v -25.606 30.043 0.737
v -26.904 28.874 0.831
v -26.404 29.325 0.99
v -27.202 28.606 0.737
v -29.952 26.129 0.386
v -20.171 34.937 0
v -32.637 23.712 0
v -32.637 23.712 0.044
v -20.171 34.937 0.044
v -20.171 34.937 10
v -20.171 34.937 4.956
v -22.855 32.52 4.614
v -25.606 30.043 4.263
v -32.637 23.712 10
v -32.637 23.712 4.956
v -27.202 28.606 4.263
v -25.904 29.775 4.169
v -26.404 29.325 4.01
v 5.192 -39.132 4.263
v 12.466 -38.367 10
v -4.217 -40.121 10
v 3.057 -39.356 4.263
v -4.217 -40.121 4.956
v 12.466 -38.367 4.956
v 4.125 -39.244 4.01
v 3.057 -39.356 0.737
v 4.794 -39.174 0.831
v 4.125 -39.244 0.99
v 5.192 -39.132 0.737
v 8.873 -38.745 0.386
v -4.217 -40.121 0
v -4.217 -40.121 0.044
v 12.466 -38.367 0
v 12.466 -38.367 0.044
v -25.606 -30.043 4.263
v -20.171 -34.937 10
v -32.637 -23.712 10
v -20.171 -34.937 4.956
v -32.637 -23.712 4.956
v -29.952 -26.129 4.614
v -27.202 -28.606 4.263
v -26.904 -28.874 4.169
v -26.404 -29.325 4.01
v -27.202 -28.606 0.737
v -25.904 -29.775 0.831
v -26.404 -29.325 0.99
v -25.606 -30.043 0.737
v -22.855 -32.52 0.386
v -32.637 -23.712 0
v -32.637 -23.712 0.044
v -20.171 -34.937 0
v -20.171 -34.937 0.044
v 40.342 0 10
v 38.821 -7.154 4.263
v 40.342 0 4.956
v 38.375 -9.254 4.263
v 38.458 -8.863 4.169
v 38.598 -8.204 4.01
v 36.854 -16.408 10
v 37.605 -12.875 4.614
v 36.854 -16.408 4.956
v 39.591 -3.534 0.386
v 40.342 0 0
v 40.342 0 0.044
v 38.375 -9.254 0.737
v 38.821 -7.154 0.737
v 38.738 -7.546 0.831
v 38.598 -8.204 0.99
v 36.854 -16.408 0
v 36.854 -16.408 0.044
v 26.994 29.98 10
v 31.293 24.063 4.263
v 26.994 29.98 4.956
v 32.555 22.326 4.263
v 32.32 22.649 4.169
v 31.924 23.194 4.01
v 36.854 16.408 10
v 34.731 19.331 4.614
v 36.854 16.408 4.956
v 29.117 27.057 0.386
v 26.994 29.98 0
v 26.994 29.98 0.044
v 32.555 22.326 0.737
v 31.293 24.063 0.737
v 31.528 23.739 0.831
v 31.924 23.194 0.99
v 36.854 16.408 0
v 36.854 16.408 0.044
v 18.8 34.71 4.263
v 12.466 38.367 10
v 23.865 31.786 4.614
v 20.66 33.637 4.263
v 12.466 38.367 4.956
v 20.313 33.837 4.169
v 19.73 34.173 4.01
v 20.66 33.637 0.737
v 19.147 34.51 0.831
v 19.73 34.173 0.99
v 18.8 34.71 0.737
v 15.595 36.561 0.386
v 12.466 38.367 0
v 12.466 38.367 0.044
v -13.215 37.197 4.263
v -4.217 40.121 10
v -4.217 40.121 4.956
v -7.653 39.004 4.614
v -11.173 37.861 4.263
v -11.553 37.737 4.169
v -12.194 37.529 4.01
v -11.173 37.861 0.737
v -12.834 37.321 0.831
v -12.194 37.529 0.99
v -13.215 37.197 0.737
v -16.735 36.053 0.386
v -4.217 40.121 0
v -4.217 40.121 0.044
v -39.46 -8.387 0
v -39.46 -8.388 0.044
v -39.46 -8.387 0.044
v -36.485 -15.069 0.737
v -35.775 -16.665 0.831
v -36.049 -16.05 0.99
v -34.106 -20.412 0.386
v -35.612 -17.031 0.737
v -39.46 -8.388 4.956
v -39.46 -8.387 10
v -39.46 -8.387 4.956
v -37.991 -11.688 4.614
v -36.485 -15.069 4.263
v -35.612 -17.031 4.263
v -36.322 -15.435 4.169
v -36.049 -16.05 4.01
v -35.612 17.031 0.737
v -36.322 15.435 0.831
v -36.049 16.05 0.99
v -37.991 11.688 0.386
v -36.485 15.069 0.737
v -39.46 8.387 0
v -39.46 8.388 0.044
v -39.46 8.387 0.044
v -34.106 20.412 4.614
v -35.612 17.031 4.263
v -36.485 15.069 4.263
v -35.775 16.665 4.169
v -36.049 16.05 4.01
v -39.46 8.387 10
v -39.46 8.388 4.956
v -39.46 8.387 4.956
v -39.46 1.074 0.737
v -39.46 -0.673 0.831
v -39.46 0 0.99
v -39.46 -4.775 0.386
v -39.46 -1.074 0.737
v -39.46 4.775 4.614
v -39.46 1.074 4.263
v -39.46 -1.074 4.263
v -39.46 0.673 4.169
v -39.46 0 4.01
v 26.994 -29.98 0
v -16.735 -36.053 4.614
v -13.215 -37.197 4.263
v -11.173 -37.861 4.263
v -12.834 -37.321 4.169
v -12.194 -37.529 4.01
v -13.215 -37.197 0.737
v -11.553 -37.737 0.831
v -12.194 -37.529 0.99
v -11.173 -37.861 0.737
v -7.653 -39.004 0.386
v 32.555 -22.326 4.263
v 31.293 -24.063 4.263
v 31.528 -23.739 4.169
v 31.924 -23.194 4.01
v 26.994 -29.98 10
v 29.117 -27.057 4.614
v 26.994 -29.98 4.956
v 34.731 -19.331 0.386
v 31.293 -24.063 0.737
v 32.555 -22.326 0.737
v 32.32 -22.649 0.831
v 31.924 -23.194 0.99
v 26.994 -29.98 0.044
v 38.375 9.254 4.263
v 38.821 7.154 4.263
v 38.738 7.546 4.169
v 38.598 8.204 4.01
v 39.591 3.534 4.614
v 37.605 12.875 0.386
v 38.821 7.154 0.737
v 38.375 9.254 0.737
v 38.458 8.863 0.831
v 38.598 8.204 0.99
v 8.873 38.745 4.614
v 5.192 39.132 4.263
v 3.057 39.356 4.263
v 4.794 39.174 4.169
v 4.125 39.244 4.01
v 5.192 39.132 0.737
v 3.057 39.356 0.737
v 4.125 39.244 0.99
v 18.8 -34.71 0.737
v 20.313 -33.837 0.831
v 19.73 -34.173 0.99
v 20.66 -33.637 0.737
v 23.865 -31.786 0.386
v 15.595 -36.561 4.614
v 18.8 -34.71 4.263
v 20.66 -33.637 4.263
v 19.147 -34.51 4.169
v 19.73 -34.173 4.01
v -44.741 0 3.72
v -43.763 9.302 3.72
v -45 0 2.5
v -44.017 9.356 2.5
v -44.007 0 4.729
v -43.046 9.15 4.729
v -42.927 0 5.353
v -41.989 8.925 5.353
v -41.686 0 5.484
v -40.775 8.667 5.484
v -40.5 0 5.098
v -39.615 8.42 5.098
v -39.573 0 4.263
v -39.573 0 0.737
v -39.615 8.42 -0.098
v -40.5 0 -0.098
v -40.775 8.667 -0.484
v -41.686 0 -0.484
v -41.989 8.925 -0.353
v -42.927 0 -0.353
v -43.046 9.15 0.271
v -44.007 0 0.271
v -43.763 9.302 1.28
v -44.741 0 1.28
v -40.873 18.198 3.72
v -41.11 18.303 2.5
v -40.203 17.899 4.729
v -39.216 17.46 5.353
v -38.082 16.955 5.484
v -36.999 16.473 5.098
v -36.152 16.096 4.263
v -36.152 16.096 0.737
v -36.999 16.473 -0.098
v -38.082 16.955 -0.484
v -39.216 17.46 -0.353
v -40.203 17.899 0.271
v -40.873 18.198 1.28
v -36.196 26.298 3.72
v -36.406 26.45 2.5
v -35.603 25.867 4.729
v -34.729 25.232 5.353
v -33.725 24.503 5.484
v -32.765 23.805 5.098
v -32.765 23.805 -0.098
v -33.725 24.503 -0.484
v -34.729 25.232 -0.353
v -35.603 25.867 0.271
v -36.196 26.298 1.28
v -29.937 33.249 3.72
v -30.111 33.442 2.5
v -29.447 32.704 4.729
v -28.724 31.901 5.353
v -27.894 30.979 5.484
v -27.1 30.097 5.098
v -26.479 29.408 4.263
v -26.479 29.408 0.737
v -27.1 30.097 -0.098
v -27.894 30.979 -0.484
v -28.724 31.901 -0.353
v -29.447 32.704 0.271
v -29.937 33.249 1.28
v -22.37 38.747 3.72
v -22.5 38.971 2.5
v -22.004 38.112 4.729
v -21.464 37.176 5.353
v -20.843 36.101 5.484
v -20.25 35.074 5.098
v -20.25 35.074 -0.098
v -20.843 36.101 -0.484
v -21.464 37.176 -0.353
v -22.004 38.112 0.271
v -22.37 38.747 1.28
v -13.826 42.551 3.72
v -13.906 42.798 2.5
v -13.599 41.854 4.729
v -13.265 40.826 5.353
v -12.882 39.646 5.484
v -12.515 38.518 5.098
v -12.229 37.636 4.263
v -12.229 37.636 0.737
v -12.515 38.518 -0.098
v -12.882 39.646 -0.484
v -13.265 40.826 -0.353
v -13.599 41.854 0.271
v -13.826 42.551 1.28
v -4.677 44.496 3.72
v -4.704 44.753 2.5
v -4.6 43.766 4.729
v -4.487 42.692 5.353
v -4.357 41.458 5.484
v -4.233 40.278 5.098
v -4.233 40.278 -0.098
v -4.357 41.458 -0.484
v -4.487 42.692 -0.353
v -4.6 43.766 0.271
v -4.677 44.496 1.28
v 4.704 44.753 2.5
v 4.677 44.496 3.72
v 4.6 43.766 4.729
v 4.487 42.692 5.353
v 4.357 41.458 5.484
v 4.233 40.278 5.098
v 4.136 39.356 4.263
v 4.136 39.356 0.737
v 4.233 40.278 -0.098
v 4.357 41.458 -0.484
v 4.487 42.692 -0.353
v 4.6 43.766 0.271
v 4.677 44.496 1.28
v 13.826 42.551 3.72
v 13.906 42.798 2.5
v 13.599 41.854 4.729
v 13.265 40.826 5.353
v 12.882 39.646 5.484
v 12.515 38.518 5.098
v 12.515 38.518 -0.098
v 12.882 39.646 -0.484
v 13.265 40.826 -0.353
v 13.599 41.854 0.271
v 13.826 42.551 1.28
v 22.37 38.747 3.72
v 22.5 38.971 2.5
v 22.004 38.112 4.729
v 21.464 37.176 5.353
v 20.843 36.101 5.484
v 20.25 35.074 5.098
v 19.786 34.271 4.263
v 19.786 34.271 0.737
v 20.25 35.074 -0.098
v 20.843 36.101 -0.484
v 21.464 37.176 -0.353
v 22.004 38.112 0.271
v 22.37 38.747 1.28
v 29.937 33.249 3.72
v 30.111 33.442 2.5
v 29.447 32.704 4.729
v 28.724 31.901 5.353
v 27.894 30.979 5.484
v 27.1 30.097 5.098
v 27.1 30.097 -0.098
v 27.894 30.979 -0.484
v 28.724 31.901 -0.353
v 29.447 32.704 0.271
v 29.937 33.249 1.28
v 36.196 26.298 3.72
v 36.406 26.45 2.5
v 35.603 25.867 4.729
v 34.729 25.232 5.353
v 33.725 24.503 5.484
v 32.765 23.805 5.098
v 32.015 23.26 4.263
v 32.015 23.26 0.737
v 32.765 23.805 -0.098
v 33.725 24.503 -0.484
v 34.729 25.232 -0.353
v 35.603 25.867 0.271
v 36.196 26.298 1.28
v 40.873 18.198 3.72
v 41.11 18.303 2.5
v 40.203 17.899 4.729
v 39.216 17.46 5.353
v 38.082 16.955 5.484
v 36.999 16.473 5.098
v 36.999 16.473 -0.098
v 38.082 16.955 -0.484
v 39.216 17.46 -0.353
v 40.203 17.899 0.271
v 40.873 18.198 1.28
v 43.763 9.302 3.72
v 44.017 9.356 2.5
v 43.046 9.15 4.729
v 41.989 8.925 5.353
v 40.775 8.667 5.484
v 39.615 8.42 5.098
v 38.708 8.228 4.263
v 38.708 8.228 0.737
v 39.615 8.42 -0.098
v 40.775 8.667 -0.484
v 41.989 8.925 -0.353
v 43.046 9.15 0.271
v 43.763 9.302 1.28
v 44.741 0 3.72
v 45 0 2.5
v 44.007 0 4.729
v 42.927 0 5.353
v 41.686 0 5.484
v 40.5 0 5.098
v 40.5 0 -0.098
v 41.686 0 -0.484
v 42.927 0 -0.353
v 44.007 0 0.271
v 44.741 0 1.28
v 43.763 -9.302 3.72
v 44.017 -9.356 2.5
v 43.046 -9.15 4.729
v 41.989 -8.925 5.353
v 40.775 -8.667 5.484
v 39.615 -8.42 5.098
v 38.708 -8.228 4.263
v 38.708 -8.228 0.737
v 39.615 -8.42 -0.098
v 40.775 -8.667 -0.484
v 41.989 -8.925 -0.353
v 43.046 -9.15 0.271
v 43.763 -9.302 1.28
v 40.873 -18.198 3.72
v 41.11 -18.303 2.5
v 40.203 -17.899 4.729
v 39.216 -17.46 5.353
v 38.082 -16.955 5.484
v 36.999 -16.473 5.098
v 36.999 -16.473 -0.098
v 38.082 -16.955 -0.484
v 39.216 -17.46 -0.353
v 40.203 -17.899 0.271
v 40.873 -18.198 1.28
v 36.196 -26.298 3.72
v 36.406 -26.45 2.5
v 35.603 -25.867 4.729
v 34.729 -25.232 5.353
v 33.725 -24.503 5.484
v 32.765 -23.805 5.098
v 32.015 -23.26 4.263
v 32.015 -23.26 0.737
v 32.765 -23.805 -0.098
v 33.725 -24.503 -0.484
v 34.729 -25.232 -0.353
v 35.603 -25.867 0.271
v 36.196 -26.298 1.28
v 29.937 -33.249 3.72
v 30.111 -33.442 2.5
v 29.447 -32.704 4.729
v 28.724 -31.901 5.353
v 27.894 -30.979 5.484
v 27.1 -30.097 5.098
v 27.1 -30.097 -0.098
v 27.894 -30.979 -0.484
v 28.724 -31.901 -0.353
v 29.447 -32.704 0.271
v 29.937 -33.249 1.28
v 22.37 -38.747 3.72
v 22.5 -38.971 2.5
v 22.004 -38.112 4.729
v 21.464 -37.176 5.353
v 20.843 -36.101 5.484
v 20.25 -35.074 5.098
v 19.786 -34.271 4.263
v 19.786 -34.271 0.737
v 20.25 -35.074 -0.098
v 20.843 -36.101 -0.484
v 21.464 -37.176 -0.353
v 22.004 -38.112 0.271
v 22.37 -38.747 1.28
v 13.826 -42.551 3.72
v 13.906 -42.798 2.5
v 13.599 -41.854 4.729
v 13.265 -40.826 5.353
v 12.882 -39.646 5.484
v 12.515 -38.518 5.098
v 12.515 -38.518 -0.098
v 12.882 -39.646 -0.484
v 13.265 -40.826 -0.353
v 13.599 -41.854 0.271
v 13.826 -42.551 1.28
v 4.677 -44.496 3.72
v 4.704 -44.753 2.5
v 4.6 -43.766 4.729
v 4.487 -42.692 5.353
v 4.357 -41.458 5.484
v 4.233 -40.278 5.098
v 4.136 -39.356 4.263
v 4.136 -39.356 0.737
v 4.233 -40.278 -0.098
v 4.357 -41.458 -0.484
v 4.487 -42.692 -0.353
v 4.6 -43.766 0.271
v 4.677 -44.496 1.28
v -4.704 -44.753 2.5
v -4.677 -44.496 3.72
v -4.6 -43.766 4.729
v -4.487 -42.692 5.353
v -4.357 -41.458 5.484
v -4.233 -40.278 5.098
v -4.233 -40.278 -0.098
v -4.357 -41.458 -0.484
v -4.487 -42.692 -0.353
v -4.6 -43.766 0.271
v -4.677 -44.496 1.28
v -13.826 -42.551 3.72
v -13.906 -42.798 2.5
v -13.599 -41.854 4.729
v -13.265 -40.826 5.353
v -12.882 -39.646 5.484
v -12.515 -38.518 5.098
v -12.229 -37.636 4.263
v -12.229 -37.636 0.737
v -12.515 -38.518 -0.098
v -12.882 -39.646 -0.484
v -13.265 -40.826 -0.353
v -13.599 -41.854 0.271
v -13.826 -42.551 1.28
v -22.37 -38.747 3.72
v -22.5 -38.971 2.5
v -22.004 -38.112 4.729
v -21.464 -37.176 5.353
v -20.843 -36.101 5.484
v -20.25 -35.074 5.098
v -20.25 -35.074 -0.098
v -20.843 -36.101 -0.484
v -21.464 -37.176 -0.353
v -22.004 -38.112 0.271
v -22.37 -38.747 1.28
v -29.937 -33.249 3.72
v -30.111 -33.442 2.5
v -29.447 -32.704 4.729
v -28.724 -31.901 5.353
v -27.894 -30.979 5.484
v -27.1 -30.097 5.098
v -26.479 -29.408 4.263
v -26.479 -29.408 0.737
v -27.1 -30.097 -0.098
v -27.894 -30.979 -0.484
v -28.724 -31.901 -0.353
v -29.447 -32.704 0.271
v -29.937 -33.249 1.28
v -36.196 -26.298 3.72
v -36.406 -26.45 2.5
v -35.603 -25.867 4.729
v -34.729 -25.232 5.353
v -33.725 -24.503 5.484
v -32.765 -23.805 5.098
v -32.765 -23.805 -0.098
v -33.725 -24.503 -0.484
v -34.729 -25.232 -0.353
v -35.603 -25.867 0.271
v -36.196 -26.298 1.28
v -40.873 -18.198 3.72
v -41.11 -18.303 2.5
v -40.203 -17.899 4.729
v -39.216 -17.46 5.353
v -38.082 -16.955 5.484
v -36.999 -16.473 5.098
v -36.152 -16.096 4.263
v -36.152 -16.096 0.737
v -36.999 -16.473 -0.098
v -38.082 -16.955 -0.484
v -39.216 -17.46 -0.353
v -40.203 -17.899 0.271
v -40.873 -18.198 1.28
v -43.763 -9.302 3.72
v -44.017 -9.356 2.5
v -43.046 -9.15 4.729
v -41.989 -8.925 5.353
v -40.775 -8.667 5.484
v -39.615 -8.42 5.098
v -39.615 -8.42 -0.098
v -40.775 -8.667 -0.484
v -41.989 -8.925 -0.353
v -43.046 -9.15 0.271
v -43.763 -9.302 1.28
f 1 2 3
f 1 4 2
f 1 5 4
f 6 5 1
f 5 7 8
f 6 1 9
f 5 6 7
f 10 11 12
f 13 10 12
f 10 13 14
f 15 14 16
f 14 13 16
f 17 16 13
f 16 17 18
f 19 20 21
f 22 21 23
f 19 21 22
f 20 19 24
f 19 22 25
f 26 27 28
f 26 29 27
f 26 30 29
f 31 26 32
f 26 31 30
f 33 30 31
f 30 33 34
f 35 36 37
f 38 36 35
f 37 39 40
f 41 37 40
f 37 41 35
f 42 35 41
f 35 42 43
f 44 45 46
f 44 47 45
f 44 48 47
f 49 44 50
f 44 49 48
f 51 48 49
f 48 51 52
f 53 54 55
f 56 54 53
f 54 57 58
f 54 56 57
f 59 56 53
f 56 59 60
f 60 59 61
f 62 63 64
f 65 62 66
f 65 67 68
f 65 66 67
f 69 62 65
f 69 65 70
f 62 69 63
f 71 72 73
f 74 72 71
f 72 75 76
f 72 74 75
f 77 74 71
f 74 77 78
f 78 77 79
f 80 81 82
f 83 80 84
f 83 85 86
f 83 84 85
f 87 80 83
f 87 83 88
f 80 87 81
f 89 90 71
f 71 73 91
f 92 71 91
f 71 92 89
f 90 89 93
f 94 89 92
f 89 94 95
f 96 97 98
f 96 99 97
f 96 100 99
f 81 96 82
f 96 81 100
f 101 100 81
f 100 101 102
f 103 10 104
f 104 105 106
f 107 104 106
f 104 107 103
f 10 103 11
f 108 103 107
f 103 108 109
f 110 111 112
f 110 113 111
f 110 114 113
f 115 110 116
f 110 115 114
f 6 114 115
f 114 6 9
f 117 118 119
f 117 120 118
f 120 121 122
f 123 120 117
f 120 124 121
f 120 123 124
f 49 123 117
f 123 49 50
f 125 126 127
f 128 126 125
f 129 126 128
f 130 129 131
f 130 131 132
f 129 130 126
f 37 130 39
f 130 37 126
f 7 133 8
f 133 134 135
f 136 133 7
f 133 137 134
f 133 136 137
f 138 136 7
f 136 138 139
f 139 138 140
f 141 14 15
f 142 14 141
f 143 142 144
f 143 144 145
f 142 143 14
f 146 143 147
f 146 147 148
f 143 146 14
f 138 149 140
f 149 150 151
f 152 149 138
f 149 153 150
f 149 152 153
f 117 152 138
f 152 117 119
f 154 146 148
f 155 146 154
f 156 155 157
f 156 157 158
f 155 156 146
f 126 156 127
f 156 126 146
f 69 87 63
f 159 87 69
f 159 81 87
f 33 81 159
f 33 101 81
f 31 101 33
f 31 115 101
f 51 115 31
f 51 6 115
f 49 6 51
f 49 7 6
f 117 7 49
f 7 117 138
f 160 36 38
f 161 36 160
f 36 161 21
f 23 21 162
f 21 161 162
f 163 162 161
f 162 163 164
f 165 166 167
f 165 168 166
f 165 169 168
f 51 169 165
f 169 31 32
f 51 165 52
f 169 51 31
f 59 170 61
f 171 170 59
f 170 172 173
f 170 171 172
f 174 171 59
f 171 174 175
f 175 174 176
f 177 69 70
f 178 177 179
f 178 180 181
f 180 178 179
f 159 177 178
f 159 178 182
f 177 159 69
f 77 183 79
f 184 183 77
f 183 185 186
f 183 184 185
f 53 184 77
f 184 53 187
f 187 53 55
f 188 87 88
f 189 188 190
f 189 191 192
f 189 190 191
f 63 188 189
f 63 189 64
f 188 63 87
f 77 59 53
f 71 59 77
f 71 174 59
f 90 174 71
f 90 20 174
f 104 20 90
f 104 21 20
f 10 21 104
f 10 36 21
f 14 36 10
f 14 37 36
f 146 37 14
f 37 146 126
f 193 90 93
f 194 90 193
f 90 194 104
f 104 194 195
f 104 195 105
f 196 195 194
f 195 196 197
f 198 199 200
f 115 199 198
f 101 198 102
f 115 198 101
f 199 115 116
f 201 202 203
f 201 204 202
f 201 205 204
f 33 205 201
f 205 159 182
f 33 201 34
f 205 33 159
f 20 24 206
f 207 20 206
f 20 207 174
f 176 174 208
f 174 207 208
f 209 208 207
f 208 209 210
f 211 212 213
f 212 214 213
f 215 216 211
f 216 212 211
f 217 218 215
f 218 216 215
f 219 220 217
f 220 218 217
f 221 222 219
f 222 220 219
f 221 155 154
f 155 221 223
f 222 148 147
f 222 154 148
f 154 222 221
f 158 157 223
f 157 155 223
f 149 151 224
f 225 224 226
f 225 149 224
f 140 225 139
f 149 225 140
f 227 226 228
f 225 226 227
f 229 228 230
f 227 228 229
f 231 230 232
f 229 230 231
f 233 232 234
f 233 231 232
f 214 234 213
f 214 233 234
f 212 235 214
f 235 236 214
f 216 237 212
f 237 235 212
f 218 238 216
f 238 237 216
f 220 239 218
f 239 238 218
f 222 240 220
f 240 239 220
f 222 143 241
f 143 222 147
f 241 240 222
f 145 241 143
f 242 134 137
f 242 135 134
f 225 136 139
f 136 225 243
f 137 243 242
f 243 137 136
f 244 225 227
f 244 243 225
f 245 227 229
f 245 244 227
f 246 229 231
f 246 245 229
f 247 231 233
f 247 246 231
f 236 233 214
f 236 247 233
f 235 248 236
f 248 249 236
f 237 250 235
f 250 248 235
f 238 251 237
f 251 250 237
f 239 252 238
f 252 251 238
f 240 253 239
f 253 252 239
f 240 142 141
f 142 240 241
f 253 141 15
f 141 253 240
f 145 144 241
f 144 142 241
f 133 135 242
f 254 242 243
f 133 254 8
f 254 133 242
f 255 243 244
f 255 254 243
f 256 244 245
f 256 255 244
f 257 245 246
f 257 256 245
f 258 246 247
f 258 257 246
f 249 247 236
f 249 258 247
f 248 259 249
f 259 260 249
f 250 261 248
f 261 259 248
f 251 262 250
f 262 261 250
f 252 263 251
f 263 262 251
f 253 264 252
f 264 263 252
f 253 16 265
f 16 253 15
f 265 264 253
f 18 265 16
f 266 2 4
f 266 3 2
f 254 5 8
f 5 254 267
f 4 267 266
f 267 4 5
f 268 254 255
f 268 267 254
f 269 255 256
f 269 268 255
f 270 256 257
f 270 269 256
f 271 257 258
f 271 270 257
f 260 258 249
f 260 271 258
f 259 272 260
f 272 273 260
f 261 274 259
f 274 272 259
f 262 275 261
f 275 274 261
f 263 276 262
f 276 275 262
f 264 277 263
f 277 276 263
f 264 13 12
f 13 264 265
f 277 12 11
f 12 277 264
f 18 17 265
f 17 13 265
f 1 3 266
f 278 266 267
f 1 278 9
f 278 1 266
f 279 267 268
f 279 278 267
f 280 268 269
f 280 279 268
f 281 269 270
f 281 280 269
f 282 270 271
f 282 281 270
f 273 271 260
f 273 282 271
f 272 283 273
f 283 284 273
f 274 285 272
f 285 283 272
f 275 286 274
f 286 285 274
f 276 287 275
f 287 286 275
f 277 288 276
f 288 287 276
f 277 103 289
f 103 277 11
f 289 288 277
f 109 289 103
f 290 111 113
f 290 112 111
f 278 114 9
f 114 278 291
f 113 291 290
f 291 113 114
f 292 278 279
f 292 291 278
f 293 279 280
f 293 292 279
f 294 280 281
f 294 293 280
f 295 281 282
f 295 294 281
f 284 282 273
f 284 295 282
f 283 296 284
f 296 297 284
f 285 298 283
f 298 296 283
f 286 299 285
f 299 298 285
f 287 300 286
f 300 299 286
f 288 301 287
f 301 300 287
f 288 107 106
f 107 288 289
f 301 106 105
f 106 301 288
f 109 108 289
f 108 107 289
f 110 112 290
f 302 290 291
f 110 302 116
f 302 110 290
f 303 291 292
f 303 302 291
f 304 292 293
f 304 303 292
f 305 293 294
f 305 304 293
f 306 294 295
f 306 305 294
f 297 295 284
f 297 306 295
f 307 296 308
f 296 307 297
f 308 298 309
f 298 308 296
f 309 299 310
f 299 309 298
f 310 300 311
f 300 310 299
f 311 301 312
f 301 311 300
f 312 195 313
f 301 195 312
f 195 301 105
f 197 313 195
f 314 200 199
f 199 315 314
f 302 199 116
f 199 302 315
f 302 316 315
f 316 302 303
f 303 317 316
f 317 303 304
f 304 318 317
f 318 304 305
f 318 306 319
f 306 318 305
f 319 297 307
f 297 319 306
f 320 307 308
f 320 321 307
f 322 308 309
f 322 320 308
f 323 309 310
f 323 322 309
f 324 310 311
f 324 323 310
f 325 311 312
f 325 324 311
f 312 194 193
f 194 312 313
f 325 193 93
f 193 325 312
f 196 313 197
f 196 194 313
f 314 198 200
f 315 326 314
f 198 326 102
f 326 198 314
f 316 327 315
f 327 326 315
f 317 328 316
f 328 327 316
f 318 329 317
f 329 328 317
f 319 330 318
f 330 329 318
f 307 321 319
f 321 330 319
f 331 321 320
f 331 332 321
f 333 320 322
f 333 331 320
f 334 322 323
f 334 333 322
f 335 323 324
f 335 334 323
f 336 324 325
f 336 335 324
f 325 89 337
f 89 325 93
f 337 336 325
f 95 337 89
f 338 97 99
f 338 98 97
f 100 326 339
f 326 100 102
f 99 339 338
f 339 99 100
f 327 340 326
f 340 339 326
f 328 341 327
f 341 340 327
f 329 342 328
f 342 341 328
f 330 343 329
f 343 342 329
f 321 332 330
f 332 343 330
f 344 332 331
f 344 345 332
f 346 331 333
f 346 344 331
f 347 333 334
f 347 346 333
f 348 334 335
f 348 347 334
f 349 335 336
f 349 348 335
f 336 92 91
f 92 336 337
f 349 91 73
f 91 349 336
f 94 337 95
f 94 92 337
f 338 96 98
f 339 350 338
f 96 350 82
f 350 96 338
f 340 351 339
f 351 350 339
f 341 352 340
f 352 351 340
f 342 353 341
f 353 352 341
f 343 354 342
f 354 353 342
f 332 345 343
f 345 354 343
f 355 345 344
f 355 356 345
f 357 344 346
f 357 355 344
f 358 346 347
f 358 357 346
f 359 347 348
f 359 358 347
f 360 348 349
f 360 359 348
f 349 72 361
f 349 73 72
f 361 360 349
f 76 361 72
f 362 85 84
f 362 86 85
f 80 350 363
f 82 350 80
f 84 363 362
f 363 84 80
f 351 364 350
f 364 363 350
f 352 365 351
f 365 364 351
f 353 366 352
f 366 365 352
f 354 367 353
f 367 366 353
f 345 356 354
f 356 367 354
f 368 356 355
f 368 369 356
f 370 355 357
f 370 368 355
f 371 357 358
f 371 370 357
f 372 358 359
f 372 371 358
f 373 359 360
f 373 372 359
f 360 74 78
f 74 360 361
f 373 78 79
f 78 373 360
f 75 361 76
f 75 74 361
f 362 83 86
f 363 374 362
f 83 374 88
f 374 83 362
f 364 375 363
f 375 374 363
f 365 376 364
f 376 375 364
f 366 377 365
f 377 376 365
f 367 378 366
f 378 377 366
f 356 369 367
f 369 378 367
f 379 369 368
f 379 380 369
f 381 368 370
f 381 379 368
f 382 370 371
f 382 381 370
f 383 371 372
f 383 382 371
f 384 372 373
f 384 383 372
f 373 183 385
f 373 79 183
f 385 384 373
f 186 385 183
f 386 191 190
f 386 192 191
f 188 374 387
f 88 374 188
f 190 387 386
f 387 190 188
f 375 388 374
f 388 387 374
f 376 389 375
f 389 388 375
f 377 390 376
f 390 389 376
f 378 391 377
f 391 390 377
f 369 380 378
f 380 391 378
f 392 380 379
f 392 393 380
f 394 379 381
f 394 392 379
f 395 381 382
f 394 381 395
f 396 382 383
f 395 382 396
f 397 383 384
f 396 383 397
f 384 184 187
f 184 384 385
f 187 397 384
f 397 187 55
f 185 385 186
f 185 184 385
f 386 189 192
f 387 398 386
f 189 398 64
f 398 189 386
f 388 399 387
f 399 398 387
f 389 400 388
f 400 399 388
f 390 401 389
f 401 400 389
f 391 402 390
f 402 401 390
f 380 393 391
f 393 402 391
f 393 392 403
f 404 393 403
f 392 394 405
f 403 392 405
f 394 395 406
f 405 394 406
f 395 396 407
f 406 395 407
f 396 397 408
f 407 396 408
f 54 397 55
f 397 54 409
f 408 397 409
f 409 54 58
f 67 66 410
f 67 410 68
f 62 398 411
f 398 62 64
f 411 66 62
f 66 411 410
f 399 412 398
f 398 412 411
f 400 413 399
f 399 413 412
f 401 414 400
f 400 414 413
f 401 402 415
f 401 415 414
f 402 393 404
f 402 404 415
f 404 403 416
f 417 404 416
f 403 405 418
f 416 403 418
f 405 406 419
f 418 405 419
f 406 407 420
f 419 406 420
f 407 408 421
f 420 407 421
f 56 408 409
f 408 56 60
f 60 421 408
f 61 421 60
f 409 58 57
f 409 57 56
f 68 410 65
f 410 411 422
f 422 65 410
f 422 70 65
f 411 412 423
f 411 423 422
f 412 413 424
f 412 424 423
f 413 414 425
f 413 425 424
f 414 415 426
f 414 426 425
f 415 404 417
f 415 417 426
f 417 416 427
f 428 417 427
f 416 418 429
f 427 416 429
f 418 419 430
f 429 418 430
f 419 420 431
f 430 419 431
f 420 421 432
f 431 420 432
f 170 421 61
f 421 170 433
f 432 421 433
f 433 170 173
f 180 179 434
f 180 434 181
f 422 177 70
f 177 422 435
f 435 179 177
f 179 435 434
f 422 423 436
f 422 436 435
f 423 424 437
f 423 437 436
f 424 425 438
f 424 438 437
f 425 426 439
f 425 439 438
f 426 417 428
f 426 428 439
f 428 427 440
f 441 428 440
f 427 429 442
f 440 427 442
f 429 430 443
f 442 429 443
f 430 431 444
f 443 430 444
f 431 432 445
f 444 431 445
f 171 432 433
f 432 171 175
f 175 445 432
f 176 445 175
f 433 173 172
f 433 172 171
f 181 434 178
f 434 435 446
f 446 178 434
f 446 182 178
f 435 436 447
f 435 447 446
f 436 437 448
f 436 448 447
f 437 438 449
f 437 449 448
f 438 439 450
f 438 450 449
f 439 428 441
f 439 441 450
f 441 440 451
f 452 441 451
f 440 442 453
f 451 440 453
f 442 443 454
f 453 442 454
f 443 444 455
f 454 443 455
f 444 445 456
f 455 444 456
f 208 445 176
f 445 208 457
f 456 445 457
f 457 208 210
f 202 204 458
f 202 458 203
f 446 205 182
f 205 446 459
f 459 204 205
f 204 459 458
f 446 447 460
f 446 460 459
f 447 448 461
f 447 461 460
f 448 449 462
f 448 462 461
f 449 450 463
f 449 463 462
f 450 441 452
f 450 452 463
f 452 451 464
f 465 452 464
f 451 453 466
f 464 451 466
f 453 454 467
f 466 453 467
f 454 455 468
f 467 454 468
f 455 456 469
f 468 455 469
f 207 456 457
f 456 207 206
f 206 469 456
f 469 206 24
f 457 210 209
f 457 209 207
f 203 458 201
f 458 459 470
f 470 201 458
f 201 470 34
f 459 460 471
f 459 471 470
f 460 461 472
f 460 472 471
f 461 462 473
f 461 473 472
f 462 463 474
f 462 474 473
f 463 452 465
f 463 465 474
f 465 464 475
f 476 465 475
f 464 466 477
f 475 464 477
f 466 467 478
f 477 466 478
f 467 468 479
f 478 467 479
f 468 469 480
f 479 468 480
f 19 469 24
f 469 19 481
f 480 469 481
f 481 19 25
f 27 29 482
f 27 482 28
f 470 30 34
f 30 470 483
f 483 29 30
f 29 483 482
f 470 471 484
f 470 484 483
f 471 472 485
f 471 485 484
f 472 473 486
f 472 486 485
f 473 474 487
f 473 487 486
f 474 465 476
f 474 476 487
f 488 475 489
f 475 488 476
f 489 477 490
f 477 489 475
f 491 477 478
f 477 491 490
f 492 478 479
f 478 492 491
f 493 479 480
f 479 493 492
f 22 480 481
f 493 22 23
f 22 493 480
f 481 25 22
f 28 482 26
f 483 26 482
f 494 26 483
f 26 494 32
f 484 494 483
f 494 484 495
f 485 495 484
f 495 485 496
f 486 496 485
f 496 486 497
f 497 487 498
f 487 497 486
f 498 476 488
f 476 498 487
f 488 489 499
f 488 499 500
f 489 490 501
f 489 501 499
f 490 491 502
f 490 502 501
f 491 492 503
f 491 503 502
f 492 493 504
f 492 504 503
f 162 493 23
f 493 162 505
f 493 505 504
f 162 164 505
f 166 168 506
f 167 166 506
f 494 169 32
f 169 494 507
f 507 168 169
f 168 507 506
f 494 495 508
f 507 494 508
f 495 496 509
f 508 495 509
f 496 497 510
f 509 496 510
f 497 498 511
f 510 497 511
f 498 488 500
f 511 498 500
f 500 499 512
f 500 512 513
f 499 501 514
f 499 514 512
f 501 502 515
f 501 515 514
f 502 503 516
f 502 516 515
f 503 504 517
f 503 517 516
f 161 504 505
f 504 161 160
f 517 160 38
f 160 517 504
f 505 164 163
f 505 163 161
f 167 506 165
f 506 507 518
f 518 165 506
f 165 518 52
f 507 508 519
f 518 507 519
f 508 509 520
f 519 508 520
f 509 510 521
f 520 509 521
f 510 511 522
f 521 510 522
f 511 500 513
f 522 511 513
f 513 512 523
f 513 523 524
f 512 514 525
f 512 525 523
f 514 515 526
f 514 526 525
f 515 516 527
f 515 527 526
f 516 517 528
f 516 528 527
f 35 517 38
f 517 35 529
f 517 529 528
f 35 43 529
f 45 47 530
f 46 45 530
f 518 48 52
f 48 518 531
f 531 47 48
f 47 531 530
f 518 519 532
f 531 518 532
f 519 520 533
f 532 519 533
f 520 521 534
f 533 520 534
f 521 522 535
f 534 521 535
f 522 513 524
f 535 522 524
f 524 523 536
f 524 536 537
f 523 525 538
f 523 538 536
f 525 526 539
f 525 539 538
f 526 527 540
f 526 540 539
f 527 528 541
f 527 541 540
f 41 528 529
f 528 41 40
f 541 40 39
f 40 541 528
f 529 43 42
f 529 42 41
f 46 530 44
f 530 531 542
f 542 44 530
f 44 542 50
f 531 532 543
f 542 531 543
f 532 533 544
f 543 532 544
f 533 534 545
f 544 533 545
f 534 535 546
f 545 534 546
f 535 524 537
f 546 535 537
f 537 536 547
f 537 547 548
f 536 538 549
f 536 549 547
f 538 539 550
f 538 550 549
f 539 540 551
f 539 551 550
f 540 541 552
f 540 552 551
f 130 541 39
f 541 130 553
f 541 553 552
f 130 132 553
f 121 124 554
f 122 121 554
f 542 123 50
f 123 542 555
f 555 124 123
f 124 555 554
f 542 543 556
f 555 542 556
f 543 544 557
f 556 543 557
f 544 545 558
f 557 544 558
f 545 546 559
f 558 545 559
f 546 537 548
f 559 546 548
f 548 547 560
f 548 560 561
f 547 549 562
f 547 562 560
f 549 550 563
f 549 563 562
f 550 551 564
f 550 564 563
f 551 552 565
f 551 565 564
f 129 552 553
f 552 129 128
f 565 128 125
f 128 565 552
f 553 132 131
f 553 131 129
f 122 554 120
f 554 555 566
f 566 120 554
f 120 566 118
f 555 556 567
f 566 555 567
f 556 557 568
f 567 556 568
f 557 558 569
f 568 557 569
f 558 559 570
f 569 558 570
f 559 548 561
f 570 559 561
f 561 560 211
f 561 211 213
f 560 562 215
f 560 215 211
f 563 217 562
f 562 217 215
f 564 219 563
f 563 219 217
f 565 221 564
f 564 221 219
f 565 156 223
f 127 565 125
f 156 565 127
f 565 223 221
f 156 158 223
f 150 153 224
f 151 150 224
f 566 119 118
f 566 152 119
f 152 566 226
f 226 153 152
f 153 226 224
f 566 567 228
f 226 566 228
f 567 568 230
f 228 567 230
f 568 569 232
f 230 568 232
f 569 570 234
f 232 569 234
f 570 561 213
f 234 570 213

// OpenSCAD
Pi = 3.141592653589793;
r0 = 5;
r_tube = 3;
t_rim = 5;
D_wheel = 90;
dist_tube = sqrt(pow(r_tube,2) - pow(t_rim/2,2));
echo(dist_tube);
R = D_wheel/2 - dist_tube - r_tube;
wRim = 20;
maxPhi = 270;
wall_t = 10;
t_hub = 10;
a = 15;

D = (R - wRim + wall_t)/r0;

n_spokes = 8;

function spiral(r0, D, x, phi) = (r0*exp(ln(D)/maxPhi*phi)-x)*[cos(phi),sin(phi)];
function reverse(list) = [for (i=[len(list)-1:-1:0]) list[i]];
function spiral_points(r0, D, maxPhi, x, a) = [for (i=[0:1:a]) spiral(r0, D, x, i/a*maxPhi)]; 

function spiral_polygon_points(r0, D, maxPhi, wall_t, a) = concat(spiral_points(r0, D, maxPhi, 0, a), reverse(spiral_points(r0, D, maxPhi, wall_t, a)));

function poly2(a,b,c, x) = [x, a*pow(x, 2) + b*x + c];


module spokes(){
    for (i=[0:1:n_spokes]){
        rotate([0,0,360/n_spokes*i]) polygon(points = spiral_polygon_points(r0, D, maxPhi, wall_t, a));    
    }
}

module hub(){
    circle(r=r0, $fn = a);
}

module rim(){
    difference() {
        circle(r=R, $fn = a);
        circle(r=R-wRim, $fn = 2*a);
    }
}


module wheel(){
    
    
    module spokes_rims_(){
        linear_extrude(height = max(t_hub, t_rim)){
            hub();
            rim();
            spokes();
        }
    }
    
    module side_profile_(){
        denom = pow(R, 2) - 2*R*r0 + pow(r0, 2);
        a_ = (t_hub - t_rim)/denom;
        b_ = 2*R*(t_rim - t_hub)/denom;
        c_ = (pow(R, 2)*t_hub - r0*t_rim*(2*R - r0))/denom;
        p = concat([[0,t_hub+1]], [for (x=[r0:R/a:R]) poly2(a_,b_,c_, x)], [[R+1, t_rim], [R+1, t_hub+1]]);
        rotate_extrude($fn = 2*a) polygon(points = p);
    }
    
    color("DarkGray")
    difference(){
        spokes_rims_();
        side_profile_();
    }
    
    color("DarkSlateGray") rotate_extrude($fn = 2*a) translate([R + dist_tube,t_rim/2]) circle(r=r_tube, $fn = a);
    
}

wheel();
